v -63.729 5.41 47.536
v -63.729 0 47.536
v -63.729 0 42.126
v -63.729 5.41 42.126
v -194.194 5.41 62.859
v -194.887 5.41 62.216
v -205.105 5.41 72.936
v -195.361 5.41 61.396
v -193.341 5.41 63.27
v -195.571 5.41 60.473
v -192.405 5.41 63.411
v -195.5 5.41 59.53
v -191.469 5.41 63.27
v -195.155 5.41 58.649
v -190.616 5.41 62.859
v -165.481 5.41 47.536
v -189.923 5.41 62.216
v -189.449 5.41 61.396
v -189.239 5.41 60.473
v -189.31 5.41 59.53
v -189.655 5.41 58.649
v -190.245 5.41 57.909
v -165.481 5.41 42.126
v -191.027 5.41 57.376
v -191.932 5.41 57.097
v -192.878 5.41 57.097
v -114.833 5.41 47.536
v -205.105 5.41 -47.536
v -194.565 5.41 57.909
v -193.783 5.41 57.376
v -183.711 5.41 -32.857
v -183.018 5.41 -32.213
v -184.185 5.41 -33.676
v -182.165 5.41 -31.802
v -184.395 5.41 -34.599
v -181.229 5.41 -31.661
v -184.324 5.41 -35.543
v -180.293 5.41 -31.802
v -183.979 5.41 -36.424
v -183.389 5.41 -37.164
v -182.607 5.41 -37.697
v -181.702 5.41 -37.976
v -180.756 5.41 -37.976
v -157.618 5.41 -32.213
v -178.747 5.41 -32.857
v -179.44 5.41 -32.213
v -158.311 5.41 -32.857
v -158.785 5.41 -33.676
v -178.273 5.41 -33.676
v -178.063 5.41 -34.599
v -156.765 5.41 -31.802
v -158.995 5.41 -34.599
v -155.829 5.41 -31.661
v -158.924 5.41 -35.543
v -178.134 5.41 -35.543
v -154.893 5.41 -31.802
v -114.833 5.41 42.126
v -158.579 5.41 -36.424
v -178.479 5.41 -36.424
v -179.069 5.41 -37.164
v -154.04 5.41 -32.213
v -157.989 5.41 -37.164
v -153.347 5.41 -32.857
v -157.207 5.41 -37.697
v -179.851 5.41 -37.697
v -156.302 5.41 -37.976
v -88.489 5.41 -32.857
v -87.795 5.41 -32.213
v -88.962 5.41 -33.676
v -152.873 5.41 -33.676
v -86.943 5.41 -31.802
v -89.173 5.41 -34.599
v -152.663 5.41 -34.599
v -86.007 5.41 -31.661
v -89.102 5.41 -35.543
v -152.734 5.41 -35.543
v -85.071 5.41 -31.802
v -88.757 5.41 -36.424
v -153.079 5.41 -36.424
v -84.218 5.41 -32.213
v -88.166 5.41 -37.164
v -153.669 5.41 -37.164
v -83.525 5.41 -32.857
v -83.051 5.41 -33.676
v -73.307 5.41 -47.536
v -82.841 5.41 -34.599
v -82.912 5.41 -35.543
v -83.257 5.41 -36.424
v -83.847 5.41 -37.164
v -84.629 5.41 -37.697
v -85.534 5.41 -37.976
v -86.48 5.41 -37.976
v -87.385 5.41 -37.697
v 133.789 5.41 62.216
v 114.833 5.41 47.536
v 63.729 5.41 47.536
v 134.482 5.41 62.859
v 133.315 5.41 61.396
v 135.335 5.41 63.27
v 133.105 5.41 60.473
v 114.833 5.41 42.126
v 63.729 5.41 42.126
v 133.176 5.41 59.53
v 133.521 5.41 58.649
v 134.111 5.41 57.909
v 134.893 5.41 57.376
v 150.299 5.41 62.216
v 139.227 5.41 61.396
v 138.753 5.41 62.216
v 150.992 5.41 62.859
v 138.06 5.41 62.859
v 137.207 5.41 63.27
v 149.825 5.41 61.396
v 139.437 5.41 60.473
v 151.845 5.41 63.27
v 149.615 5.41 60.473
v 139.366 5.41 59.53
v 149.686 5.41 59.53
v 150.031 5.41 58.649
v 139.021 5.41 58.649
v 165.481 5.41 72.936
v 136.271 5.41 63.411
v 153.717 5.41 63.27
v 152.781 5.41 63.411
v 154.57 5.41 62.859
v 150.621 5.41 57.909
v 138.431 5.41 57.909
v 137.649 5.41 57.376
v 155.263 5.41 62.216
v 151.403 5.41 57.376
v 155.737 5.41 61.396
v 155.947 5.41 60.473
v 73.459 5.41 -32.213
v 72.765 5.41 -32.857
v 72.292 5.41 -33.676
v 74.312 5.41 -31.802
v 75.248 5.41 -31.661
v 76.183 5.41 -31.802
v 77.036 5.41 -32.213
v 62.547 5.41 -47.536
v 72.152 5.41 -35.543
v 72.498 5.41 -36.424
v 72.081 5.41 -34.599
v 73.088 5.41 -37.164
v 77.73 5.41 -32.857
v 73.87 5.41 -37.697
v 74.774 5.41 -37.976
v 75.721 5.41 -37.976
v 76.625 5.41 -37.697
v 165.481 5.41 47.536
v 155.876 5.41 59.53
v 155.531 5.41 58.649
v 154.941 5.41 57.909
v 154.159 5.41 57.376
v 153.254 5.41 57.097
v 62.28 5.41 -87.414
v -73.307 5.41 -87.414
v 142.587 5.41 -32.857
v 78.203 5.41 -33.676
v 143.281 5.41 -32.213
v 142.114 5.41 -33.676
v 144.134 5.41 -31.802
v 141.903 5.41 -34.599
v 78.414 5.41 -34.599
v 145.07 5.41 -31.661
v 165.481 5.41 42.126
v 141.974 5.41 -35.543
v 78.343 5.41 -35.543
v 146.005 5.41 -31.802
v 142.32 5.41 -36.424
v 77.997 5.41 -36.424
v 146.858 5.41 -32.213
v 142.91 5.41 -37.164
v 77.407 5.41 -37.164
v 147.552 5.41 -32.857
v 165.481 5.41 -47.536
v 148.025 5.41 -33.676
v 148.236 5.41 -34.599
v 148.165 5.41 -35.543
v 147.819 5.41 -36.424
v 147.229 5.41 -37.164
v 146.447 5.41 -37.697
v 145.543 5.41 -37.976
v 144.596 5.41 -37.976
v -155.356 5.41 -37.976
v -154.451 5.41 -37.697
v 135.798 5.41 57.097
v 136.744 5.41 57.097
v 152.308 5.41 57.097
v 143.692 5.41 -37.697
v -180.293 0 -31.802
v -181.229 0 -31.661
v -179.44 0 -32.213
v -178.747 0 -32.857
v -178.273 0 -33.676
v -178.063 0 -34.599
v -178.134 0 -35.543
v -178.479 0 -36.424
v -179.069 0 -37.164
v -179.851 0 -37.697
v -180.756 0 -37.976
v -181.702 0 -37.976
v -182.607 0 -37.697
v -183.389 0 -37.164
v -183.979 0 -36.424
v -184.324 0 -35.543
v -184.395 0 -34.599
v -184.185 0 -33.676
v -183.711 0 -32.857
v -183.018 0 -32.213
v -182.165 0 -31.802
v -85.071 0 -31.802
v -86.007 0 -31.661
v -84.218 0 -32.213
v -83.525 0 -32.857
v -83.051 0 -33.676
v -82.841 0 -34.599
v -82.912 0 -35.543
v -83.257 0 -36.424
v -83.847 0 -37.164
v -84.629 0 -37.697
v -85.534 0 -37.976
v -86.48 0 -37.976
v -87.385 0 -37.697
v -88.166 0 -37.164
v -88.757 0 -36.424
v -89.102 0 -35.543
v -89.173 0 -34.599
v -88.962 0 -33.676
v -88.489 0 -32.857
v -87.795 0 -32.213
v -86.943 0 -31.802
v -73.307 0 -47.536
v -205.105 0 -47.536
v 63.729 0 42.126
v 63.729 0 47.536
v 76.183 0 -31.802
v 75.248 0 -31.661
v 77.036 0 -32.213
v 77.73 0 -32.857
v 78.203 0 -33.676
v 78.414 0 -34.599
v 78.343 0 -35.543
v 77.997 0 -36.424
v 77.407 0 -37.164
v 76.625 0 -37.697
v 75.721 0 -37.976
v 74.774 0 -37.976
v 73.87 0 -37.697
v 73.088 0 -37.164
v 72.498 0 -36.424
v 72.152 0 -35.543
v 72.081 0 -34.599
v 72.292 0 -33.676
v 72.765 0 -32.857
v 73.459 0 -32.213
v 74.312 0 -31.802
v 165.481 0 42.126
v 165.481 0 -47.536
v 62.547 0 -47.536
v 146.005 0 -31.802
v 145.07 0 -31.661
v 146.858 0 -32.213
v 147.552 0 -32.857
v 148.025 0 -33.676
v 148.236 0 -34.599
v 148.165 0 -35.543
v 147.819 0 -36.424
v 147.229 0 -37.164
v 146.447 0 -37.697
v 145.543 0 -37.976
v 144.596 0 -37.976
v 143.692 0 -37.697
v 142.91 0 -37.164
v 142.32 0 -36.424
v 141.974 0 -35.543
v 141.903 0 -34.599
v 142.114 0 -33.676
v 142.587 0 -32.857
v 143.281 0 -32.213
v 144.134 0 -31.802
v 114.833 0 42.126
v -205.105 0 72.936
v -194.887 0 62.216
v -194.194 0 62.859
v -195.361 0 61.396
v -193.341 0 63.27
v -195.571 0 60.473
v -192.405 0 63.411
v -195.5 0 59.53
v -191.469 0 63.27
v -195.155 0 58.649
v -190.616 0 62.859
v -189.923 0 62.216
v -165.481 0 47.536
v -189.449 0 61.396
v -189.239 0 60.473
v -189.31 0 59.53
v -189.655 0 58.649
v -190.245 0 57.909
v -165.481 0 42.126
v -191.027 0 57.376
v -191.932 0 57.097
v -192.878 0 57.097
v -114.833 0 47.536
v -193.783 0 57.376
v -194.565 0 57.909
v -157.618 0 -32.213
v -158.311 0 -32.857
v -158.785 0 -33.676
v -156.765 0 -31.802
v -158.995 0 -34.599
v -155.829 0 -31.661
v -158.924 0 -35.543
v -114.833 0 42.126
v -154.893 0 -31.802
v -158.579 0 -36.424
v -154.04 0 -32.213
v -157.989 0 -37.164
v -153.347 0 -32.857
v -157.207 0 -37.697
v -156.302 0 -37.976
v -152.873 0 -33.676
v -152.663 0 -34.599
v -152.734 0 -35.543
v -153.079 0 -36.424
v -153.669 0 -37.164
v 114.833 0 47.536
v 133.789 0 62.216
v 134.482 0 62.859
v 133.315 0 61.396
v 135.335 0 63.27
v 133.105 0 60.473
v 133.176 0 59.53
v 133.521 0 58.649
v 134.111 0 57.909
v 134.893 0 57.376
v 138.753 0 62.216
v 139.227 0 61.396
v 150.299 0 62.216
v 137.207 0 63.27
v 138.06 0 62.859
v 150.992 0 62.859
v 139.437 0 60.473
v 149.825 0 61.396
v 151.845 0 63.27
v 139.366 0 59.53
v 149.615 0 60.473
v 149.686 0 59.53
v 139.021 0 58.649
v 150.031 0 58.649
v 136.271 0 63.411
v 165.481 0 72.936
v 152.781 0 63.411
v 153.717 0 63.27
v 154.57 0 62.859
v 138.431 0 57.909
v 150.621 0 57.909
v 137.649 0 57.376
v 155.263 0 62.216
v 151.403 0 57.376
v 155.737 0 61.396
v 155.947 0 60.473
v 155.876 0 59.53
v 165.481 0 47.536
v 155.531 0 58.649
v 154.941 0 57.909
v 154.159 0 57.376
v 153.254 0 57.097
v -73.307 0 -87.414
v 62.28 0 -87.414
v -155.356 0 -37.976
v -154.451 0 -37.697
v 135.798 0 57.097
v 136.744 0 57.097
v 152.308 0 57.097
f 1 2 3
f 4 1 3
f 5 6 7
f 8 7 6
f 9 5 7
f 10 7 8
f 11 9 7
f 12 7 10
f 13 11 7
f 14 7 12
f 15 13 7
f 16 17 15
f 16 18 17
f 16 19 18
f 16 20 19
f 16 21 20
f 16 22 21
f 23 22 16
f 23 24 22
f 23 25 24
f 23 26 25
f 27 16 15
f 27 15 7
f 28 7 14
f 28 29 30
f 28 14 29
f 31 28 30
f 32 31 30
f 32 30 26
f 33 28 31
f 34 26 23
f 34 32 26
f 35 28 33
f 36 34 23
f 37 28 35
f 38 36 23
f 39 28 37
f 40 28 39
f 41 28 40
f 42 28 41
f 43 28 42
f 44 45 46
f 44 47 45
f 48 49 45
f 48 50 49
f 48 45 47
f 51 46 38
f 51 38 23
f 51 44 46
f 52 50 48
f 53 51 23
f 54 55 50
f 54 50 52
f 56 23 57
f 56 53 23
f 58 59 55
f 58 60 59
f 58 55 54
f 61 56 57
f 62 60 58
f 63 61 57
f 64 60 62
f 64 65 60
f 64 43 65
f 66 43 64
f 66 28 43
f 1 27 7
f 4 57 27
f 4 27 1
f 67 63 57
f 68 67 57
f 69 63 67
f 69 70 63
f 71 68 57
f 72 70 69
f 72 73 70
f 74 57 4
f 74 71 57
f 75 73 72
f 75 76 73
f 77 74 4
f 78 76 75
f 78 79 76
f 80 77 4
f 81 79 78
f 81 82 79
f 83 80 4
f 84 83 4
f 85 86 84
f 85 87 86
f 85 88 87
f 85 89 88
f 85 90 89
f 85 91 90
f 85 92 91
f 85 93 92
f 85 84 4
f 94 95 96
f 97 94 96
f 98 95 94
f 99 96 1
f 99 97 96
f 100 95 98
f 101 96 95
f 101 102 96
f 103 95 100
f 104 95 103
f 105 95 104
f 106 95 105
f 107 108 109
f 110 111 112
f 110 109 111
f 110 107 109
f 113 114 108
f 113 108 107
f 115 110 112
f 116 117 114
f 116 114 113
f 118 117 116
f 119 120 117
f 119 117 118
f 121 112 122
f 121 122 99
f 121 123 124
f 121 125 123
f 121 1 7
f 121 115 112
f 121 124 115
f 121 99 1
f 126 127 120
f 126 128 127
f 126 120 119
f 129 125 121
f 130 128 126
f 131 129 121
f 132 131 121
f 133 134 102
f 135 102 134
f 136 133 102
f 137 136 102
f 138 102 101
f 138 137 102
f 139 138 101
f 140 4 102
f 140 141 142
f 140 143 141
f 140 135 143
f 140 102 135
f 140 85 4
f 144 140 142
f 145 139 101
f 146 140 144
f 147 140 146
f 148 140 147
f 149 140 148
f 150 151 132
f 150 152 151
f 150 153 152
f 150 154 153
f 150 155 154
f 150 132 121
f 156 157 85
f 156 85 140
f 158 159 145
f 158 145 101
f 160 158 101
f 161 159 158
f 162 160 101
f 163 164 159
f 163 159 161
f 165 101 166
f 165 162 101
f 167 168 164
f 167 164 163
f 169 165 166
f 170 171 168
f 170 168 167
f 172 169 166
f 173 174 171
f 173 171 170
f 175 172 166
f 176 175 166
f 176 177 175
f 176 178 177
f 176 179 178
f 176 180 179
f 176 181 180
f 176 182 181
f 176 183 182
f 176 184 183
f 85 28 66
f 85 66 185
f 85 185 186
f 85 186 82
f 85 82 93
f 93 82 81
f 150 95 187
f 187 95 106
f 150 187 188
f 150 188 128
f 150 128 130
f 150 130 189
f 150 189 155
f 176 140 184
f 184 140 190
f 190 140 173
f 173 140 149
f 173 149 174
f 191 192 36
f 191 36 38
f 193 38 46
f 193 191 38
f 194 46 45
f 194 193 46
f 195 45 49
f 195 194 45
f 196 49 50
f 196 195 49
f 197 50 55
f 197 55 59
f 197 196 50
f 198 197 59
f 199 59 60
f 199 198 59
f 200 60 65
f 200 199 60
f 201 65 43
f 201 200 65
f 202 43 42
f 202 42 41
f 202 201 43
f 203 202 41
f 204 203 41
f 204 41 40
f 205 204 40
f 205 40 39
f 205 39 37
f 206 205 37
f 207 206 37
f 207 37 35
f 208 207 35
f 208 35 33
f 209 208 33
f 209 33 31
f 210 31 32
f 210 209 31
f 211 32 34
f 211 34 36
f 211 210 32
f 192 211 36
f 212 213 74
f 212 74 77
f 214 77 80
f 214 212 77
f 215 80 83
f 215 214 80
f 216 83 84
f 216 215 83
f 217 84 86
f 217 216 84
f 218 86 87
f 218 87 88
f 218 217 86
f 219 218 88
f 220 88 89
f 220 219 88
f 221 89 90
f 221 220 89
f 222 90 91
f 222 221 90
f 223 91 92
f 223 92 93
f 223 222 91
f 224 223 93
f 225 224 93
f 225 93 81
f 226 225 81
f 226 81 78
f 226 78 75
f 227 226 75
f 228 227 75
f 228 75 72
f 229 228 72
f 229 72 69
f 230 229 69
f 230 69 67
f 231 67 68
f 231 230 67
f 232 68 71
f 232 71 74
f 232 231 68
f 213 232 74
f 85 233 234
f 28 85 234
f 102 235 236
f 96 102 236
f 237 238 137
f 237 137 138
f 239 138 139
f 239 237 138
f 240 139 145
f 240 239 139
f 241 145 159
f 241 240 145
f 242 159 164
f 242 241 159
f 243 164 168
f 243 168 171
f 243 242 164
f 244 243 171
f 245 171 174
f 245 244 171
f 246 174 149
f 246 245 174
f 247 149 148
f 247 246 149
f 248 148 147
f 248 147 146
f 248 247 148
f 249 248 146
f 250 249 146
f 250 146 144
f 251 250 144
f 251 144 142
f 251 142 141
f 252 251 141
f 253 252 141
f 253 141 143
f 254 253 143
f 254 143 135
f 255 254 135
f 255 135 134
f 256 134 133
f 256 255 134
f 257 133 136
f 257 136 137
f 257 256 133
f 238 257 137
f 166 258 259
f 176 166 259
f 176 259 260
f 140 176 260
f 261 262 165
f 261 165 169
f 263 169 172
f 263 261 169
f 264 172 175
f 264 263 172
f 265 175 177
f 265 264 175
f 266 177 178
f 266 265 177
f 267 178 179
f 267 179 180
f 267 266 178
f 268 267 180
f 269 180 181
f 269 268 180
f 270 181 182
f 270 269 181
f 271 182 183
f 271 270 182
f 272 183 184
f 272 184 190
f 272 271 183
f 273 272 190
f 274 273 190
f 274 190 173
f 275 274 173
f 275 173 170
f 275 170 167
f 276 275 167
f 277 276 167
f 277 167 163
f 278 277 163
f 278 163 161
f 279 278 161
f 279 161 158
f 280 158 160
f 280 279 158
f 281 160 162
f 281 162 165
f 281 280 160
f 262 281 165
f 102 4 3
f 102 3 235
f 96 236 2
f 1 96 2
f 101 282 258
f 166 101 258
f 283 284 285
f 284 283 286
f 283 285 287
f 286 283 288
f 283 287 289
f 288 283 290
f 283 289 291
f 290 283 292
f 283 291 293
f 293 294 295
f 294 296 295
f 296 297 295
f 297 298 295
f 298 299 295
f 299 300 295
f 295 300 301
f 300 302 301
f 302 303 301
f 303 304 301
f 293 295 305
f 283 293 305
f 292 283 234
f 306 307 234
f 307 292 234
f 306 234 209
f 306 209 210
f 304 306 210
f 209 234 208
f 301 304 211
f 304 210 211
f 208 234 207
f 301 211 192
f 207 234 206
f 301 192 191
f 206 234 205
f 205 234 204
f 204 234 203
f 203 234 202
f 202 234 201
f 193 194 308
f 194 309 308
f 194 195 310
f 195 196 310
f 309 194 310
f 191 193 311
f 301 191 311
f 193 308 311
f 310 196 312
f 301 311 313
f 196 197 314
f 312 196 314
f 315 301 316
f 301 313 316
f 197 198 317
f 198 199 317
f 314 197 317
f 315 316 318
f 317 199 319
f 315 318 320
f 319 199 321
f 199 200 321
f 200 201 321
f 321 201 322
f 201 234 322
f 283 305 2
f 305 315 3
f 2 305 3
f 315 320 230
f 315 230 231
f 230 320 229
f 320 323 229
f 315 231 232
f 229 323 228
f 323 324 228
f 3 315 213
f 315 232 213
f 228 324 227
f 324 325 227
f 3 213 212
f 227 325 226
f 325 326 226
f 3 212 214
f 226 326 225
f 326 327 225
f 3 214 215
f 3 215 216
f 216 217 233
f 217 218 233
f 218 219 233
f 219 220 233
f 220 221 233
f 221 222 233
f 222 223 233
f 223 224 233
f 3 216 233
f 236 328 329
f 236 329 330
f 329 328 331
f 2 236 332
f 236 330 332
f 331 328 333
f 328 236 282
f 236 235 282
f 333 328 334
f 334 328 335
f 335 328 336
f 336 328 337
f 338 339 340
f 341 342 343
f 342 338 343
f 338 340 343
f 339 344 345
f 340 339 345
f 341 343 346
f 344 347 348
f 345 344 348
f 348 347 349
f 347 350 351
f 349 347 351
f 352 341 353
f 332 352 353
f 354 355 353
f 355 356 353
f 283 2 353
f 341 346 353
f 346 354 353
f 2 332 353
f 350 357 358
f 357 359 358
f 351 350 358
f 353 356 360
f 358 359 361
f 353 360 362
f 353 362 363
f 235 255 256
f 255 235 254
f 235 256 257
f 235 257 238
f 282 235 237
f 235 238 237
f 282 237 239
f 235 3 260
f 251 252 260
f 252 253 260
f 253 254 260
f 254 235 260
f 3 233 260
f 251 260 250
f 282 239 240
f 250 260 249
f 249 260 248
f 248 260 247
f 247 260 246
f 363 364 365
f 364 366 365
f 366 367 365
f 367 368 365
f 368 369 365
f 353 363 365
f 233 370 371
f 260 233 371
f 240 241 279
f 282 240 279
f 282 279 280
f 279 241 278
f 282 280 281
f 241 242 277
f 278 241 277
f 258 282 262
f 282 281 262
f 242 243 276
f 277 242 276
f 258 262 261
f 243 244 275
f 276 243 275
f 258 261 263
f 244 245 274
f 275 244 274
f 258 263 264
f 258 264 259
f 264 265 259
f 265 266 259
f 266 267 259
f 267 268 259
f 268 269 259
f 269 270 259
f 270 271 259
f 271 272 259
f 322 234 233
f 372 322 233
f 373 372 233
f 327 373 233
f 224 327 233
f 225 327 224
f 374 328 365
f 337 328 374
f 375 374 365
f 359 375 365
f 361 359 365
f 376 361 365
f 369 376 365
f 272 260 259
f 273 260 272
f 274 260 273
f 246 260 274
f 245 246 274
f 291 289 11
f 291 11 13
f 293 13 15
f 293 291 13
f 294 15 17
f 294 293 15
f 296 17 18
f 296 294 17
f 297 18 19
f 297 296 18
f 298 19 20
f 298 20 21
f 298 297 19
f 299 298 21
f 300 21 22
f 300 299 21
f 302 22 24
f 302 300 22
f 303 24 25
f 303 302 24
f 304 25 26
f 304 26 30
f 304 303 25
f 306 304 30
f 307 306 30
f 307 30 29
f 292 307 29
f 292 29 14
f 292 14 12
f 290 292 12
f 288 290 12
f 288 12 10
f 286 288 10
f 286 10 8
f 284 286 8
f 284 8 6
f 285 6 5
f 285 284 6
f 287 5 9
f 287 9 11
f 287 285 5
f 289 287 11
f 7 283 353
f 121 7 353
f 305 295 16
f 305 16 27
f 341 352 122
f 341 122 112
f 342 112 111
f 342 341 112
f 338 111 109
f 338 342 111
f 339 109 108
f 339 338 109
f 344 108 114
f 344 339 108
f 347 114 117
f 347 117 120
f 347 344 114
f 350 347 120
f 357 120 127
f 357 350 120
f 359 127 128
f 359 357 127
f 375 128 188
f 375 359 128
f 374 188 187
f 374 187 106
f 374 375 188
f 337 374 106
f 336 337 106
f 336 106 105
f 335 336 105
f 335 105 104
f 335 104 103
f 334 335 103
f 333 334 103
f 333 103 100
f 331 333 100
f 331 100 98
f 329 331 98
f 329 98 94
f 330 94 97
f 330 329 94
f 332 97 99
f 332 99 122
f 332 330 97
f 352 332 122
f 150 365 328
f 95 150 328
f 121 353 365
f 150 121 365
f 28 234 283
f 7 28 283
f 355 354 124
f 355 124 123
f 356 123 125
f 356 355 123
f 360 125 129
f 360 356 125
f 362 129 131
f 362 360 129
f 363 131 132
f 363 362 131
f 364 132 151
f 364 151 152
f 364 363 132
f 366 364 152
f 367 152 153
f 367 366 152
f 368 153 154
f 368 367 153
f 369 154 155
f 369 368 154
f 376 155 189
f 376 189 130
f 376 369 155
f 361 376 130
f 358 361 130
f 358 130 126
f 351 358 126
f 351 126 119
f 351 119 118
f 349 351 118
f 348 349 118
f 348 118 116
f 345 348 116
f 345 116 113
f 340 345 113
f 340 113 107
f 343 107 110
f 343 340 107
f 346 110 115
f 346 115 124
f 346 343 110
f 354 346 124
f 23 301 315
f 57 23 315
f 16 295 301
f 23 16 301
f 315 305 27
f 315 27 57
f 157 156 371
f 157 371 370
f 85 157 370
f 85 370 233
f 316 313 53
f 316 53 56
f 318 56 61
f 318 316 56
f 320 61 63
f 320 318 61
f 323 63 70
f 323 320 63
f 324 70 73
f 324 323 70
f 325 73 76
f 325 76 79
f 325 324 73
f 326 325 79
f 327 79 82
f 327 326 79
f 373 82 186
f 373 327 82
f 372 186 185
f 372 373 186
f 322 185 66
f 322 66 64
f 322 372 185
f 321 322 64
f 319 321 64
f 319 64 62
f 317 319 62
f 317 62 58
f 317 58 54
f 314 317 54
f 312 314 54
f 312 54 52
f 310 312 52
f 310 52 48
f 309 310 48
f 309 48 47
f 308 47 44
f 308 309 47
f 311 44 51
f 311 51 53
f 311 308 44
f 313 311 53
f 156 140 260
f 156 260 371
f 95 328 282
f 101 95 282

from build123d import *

# Parameters (mm, degrees)
SKETCH1_W           = 50.6476
SKETCH1_H           = 5.4102
SKETCH1_R           = 3.175
BOSS_EXTRUDE1_DEPTH = 5.4102
BOSS_EXTRUDE3_DEPTH = 5.4102


with BuildPart() as part:
    # Sketch1 → Boss-Extrude1 (new body)
    with BuildSketch(Plane(origin=(0, 0, 0), x_dir=(1, 0, 0), z_dir=(0, 1, 0))):
        Polygon((-205.105, 47.5361), (-205.105, -72.9361), (165.481, -72.9361), (165.481, -47.5361), (114.8334, -47.5361), (114.8334, -42.1259), (165.481, -42.1259), (165.481, 47.5361), (62.5475, 47.5361), (62.5475, -42.1259), (63.7286, -42.1259), (63.7286, -47.5361), (-63.7286, -47.5361), (-63.7286, -42.1259), (-73.30694, -42.1259), (-73.30694, 47.5361), align=None)
        with Locations((-140.1572, -44.831)):
            Rectangle(SKETCH1_W, SKETCH1_H, mode=Mode.SUBTRACT)
        with Locations(Location((-181.229, 34.8361, 0), (0, 0, 270))):
            Circle(SKETCH1_R, mode=Mode.SUBTRACT)
        with Locations(Location((152.781, -60.2361, 0), (0, 0, 270))):
            Circle(SKETCH1_R, mode=Mode.SUBTRACT)
        with Locations(Location((-192.405, -60.2361, 0), (0, 0, 270))):
            Circle(SKETCH1_R, mode=Mode.SUBTRACT)
        with Locations(Location((136.271, -60.2361, 0), (0, 0, 270))):
            Circle(SKETCH1_R, mode=Mode.SUBTRACT)
        with Locations(Location((-155.829, 34.8361, 0), (0, 0, 270))):
            Circle(SKETCH1_R, mode=Mode.SUBTRACT)
        with Locations(Location((-86.00694, 34.8361, 0), (0, 0, 270))):
            Circle(SKETCH1_R, mode=Mode.SUBTRACT)
        with Locations(Location((145.06956, 34.8361, 0), (0, 0, 270))):
            Circle(SKETCH1_R, mode=Mode.SUBTRACT)
        with Locations(Location((75.2475, 34.8361, 0), (0, 0, 270))):
            Circle(SKETCH1_R, mode=Mode.SUBTRACT)
    extrude(amount=BOSS_EXTRUDE1_DEPTH)

    # Sketch2 → Boss-Extrude3 (add)
    with BuildSketch(Plane(origin=(0, 5.4102, 0), x_dir=(1, 0, 0), z_dir=(0, 1, 0))):
        Polygon((-63.7286, -42.1259), (62.5475, -42.1259), (62.5475, 47.5361), (62.280495402, 87.4141), (-73.30694, 87.4141), (-73.30694, 47.5361), (-73.30694, -42.1259), align=None)
    extrude(amount=-BOSS_EXTRUDE3_DEPTH)


solid = part.part
